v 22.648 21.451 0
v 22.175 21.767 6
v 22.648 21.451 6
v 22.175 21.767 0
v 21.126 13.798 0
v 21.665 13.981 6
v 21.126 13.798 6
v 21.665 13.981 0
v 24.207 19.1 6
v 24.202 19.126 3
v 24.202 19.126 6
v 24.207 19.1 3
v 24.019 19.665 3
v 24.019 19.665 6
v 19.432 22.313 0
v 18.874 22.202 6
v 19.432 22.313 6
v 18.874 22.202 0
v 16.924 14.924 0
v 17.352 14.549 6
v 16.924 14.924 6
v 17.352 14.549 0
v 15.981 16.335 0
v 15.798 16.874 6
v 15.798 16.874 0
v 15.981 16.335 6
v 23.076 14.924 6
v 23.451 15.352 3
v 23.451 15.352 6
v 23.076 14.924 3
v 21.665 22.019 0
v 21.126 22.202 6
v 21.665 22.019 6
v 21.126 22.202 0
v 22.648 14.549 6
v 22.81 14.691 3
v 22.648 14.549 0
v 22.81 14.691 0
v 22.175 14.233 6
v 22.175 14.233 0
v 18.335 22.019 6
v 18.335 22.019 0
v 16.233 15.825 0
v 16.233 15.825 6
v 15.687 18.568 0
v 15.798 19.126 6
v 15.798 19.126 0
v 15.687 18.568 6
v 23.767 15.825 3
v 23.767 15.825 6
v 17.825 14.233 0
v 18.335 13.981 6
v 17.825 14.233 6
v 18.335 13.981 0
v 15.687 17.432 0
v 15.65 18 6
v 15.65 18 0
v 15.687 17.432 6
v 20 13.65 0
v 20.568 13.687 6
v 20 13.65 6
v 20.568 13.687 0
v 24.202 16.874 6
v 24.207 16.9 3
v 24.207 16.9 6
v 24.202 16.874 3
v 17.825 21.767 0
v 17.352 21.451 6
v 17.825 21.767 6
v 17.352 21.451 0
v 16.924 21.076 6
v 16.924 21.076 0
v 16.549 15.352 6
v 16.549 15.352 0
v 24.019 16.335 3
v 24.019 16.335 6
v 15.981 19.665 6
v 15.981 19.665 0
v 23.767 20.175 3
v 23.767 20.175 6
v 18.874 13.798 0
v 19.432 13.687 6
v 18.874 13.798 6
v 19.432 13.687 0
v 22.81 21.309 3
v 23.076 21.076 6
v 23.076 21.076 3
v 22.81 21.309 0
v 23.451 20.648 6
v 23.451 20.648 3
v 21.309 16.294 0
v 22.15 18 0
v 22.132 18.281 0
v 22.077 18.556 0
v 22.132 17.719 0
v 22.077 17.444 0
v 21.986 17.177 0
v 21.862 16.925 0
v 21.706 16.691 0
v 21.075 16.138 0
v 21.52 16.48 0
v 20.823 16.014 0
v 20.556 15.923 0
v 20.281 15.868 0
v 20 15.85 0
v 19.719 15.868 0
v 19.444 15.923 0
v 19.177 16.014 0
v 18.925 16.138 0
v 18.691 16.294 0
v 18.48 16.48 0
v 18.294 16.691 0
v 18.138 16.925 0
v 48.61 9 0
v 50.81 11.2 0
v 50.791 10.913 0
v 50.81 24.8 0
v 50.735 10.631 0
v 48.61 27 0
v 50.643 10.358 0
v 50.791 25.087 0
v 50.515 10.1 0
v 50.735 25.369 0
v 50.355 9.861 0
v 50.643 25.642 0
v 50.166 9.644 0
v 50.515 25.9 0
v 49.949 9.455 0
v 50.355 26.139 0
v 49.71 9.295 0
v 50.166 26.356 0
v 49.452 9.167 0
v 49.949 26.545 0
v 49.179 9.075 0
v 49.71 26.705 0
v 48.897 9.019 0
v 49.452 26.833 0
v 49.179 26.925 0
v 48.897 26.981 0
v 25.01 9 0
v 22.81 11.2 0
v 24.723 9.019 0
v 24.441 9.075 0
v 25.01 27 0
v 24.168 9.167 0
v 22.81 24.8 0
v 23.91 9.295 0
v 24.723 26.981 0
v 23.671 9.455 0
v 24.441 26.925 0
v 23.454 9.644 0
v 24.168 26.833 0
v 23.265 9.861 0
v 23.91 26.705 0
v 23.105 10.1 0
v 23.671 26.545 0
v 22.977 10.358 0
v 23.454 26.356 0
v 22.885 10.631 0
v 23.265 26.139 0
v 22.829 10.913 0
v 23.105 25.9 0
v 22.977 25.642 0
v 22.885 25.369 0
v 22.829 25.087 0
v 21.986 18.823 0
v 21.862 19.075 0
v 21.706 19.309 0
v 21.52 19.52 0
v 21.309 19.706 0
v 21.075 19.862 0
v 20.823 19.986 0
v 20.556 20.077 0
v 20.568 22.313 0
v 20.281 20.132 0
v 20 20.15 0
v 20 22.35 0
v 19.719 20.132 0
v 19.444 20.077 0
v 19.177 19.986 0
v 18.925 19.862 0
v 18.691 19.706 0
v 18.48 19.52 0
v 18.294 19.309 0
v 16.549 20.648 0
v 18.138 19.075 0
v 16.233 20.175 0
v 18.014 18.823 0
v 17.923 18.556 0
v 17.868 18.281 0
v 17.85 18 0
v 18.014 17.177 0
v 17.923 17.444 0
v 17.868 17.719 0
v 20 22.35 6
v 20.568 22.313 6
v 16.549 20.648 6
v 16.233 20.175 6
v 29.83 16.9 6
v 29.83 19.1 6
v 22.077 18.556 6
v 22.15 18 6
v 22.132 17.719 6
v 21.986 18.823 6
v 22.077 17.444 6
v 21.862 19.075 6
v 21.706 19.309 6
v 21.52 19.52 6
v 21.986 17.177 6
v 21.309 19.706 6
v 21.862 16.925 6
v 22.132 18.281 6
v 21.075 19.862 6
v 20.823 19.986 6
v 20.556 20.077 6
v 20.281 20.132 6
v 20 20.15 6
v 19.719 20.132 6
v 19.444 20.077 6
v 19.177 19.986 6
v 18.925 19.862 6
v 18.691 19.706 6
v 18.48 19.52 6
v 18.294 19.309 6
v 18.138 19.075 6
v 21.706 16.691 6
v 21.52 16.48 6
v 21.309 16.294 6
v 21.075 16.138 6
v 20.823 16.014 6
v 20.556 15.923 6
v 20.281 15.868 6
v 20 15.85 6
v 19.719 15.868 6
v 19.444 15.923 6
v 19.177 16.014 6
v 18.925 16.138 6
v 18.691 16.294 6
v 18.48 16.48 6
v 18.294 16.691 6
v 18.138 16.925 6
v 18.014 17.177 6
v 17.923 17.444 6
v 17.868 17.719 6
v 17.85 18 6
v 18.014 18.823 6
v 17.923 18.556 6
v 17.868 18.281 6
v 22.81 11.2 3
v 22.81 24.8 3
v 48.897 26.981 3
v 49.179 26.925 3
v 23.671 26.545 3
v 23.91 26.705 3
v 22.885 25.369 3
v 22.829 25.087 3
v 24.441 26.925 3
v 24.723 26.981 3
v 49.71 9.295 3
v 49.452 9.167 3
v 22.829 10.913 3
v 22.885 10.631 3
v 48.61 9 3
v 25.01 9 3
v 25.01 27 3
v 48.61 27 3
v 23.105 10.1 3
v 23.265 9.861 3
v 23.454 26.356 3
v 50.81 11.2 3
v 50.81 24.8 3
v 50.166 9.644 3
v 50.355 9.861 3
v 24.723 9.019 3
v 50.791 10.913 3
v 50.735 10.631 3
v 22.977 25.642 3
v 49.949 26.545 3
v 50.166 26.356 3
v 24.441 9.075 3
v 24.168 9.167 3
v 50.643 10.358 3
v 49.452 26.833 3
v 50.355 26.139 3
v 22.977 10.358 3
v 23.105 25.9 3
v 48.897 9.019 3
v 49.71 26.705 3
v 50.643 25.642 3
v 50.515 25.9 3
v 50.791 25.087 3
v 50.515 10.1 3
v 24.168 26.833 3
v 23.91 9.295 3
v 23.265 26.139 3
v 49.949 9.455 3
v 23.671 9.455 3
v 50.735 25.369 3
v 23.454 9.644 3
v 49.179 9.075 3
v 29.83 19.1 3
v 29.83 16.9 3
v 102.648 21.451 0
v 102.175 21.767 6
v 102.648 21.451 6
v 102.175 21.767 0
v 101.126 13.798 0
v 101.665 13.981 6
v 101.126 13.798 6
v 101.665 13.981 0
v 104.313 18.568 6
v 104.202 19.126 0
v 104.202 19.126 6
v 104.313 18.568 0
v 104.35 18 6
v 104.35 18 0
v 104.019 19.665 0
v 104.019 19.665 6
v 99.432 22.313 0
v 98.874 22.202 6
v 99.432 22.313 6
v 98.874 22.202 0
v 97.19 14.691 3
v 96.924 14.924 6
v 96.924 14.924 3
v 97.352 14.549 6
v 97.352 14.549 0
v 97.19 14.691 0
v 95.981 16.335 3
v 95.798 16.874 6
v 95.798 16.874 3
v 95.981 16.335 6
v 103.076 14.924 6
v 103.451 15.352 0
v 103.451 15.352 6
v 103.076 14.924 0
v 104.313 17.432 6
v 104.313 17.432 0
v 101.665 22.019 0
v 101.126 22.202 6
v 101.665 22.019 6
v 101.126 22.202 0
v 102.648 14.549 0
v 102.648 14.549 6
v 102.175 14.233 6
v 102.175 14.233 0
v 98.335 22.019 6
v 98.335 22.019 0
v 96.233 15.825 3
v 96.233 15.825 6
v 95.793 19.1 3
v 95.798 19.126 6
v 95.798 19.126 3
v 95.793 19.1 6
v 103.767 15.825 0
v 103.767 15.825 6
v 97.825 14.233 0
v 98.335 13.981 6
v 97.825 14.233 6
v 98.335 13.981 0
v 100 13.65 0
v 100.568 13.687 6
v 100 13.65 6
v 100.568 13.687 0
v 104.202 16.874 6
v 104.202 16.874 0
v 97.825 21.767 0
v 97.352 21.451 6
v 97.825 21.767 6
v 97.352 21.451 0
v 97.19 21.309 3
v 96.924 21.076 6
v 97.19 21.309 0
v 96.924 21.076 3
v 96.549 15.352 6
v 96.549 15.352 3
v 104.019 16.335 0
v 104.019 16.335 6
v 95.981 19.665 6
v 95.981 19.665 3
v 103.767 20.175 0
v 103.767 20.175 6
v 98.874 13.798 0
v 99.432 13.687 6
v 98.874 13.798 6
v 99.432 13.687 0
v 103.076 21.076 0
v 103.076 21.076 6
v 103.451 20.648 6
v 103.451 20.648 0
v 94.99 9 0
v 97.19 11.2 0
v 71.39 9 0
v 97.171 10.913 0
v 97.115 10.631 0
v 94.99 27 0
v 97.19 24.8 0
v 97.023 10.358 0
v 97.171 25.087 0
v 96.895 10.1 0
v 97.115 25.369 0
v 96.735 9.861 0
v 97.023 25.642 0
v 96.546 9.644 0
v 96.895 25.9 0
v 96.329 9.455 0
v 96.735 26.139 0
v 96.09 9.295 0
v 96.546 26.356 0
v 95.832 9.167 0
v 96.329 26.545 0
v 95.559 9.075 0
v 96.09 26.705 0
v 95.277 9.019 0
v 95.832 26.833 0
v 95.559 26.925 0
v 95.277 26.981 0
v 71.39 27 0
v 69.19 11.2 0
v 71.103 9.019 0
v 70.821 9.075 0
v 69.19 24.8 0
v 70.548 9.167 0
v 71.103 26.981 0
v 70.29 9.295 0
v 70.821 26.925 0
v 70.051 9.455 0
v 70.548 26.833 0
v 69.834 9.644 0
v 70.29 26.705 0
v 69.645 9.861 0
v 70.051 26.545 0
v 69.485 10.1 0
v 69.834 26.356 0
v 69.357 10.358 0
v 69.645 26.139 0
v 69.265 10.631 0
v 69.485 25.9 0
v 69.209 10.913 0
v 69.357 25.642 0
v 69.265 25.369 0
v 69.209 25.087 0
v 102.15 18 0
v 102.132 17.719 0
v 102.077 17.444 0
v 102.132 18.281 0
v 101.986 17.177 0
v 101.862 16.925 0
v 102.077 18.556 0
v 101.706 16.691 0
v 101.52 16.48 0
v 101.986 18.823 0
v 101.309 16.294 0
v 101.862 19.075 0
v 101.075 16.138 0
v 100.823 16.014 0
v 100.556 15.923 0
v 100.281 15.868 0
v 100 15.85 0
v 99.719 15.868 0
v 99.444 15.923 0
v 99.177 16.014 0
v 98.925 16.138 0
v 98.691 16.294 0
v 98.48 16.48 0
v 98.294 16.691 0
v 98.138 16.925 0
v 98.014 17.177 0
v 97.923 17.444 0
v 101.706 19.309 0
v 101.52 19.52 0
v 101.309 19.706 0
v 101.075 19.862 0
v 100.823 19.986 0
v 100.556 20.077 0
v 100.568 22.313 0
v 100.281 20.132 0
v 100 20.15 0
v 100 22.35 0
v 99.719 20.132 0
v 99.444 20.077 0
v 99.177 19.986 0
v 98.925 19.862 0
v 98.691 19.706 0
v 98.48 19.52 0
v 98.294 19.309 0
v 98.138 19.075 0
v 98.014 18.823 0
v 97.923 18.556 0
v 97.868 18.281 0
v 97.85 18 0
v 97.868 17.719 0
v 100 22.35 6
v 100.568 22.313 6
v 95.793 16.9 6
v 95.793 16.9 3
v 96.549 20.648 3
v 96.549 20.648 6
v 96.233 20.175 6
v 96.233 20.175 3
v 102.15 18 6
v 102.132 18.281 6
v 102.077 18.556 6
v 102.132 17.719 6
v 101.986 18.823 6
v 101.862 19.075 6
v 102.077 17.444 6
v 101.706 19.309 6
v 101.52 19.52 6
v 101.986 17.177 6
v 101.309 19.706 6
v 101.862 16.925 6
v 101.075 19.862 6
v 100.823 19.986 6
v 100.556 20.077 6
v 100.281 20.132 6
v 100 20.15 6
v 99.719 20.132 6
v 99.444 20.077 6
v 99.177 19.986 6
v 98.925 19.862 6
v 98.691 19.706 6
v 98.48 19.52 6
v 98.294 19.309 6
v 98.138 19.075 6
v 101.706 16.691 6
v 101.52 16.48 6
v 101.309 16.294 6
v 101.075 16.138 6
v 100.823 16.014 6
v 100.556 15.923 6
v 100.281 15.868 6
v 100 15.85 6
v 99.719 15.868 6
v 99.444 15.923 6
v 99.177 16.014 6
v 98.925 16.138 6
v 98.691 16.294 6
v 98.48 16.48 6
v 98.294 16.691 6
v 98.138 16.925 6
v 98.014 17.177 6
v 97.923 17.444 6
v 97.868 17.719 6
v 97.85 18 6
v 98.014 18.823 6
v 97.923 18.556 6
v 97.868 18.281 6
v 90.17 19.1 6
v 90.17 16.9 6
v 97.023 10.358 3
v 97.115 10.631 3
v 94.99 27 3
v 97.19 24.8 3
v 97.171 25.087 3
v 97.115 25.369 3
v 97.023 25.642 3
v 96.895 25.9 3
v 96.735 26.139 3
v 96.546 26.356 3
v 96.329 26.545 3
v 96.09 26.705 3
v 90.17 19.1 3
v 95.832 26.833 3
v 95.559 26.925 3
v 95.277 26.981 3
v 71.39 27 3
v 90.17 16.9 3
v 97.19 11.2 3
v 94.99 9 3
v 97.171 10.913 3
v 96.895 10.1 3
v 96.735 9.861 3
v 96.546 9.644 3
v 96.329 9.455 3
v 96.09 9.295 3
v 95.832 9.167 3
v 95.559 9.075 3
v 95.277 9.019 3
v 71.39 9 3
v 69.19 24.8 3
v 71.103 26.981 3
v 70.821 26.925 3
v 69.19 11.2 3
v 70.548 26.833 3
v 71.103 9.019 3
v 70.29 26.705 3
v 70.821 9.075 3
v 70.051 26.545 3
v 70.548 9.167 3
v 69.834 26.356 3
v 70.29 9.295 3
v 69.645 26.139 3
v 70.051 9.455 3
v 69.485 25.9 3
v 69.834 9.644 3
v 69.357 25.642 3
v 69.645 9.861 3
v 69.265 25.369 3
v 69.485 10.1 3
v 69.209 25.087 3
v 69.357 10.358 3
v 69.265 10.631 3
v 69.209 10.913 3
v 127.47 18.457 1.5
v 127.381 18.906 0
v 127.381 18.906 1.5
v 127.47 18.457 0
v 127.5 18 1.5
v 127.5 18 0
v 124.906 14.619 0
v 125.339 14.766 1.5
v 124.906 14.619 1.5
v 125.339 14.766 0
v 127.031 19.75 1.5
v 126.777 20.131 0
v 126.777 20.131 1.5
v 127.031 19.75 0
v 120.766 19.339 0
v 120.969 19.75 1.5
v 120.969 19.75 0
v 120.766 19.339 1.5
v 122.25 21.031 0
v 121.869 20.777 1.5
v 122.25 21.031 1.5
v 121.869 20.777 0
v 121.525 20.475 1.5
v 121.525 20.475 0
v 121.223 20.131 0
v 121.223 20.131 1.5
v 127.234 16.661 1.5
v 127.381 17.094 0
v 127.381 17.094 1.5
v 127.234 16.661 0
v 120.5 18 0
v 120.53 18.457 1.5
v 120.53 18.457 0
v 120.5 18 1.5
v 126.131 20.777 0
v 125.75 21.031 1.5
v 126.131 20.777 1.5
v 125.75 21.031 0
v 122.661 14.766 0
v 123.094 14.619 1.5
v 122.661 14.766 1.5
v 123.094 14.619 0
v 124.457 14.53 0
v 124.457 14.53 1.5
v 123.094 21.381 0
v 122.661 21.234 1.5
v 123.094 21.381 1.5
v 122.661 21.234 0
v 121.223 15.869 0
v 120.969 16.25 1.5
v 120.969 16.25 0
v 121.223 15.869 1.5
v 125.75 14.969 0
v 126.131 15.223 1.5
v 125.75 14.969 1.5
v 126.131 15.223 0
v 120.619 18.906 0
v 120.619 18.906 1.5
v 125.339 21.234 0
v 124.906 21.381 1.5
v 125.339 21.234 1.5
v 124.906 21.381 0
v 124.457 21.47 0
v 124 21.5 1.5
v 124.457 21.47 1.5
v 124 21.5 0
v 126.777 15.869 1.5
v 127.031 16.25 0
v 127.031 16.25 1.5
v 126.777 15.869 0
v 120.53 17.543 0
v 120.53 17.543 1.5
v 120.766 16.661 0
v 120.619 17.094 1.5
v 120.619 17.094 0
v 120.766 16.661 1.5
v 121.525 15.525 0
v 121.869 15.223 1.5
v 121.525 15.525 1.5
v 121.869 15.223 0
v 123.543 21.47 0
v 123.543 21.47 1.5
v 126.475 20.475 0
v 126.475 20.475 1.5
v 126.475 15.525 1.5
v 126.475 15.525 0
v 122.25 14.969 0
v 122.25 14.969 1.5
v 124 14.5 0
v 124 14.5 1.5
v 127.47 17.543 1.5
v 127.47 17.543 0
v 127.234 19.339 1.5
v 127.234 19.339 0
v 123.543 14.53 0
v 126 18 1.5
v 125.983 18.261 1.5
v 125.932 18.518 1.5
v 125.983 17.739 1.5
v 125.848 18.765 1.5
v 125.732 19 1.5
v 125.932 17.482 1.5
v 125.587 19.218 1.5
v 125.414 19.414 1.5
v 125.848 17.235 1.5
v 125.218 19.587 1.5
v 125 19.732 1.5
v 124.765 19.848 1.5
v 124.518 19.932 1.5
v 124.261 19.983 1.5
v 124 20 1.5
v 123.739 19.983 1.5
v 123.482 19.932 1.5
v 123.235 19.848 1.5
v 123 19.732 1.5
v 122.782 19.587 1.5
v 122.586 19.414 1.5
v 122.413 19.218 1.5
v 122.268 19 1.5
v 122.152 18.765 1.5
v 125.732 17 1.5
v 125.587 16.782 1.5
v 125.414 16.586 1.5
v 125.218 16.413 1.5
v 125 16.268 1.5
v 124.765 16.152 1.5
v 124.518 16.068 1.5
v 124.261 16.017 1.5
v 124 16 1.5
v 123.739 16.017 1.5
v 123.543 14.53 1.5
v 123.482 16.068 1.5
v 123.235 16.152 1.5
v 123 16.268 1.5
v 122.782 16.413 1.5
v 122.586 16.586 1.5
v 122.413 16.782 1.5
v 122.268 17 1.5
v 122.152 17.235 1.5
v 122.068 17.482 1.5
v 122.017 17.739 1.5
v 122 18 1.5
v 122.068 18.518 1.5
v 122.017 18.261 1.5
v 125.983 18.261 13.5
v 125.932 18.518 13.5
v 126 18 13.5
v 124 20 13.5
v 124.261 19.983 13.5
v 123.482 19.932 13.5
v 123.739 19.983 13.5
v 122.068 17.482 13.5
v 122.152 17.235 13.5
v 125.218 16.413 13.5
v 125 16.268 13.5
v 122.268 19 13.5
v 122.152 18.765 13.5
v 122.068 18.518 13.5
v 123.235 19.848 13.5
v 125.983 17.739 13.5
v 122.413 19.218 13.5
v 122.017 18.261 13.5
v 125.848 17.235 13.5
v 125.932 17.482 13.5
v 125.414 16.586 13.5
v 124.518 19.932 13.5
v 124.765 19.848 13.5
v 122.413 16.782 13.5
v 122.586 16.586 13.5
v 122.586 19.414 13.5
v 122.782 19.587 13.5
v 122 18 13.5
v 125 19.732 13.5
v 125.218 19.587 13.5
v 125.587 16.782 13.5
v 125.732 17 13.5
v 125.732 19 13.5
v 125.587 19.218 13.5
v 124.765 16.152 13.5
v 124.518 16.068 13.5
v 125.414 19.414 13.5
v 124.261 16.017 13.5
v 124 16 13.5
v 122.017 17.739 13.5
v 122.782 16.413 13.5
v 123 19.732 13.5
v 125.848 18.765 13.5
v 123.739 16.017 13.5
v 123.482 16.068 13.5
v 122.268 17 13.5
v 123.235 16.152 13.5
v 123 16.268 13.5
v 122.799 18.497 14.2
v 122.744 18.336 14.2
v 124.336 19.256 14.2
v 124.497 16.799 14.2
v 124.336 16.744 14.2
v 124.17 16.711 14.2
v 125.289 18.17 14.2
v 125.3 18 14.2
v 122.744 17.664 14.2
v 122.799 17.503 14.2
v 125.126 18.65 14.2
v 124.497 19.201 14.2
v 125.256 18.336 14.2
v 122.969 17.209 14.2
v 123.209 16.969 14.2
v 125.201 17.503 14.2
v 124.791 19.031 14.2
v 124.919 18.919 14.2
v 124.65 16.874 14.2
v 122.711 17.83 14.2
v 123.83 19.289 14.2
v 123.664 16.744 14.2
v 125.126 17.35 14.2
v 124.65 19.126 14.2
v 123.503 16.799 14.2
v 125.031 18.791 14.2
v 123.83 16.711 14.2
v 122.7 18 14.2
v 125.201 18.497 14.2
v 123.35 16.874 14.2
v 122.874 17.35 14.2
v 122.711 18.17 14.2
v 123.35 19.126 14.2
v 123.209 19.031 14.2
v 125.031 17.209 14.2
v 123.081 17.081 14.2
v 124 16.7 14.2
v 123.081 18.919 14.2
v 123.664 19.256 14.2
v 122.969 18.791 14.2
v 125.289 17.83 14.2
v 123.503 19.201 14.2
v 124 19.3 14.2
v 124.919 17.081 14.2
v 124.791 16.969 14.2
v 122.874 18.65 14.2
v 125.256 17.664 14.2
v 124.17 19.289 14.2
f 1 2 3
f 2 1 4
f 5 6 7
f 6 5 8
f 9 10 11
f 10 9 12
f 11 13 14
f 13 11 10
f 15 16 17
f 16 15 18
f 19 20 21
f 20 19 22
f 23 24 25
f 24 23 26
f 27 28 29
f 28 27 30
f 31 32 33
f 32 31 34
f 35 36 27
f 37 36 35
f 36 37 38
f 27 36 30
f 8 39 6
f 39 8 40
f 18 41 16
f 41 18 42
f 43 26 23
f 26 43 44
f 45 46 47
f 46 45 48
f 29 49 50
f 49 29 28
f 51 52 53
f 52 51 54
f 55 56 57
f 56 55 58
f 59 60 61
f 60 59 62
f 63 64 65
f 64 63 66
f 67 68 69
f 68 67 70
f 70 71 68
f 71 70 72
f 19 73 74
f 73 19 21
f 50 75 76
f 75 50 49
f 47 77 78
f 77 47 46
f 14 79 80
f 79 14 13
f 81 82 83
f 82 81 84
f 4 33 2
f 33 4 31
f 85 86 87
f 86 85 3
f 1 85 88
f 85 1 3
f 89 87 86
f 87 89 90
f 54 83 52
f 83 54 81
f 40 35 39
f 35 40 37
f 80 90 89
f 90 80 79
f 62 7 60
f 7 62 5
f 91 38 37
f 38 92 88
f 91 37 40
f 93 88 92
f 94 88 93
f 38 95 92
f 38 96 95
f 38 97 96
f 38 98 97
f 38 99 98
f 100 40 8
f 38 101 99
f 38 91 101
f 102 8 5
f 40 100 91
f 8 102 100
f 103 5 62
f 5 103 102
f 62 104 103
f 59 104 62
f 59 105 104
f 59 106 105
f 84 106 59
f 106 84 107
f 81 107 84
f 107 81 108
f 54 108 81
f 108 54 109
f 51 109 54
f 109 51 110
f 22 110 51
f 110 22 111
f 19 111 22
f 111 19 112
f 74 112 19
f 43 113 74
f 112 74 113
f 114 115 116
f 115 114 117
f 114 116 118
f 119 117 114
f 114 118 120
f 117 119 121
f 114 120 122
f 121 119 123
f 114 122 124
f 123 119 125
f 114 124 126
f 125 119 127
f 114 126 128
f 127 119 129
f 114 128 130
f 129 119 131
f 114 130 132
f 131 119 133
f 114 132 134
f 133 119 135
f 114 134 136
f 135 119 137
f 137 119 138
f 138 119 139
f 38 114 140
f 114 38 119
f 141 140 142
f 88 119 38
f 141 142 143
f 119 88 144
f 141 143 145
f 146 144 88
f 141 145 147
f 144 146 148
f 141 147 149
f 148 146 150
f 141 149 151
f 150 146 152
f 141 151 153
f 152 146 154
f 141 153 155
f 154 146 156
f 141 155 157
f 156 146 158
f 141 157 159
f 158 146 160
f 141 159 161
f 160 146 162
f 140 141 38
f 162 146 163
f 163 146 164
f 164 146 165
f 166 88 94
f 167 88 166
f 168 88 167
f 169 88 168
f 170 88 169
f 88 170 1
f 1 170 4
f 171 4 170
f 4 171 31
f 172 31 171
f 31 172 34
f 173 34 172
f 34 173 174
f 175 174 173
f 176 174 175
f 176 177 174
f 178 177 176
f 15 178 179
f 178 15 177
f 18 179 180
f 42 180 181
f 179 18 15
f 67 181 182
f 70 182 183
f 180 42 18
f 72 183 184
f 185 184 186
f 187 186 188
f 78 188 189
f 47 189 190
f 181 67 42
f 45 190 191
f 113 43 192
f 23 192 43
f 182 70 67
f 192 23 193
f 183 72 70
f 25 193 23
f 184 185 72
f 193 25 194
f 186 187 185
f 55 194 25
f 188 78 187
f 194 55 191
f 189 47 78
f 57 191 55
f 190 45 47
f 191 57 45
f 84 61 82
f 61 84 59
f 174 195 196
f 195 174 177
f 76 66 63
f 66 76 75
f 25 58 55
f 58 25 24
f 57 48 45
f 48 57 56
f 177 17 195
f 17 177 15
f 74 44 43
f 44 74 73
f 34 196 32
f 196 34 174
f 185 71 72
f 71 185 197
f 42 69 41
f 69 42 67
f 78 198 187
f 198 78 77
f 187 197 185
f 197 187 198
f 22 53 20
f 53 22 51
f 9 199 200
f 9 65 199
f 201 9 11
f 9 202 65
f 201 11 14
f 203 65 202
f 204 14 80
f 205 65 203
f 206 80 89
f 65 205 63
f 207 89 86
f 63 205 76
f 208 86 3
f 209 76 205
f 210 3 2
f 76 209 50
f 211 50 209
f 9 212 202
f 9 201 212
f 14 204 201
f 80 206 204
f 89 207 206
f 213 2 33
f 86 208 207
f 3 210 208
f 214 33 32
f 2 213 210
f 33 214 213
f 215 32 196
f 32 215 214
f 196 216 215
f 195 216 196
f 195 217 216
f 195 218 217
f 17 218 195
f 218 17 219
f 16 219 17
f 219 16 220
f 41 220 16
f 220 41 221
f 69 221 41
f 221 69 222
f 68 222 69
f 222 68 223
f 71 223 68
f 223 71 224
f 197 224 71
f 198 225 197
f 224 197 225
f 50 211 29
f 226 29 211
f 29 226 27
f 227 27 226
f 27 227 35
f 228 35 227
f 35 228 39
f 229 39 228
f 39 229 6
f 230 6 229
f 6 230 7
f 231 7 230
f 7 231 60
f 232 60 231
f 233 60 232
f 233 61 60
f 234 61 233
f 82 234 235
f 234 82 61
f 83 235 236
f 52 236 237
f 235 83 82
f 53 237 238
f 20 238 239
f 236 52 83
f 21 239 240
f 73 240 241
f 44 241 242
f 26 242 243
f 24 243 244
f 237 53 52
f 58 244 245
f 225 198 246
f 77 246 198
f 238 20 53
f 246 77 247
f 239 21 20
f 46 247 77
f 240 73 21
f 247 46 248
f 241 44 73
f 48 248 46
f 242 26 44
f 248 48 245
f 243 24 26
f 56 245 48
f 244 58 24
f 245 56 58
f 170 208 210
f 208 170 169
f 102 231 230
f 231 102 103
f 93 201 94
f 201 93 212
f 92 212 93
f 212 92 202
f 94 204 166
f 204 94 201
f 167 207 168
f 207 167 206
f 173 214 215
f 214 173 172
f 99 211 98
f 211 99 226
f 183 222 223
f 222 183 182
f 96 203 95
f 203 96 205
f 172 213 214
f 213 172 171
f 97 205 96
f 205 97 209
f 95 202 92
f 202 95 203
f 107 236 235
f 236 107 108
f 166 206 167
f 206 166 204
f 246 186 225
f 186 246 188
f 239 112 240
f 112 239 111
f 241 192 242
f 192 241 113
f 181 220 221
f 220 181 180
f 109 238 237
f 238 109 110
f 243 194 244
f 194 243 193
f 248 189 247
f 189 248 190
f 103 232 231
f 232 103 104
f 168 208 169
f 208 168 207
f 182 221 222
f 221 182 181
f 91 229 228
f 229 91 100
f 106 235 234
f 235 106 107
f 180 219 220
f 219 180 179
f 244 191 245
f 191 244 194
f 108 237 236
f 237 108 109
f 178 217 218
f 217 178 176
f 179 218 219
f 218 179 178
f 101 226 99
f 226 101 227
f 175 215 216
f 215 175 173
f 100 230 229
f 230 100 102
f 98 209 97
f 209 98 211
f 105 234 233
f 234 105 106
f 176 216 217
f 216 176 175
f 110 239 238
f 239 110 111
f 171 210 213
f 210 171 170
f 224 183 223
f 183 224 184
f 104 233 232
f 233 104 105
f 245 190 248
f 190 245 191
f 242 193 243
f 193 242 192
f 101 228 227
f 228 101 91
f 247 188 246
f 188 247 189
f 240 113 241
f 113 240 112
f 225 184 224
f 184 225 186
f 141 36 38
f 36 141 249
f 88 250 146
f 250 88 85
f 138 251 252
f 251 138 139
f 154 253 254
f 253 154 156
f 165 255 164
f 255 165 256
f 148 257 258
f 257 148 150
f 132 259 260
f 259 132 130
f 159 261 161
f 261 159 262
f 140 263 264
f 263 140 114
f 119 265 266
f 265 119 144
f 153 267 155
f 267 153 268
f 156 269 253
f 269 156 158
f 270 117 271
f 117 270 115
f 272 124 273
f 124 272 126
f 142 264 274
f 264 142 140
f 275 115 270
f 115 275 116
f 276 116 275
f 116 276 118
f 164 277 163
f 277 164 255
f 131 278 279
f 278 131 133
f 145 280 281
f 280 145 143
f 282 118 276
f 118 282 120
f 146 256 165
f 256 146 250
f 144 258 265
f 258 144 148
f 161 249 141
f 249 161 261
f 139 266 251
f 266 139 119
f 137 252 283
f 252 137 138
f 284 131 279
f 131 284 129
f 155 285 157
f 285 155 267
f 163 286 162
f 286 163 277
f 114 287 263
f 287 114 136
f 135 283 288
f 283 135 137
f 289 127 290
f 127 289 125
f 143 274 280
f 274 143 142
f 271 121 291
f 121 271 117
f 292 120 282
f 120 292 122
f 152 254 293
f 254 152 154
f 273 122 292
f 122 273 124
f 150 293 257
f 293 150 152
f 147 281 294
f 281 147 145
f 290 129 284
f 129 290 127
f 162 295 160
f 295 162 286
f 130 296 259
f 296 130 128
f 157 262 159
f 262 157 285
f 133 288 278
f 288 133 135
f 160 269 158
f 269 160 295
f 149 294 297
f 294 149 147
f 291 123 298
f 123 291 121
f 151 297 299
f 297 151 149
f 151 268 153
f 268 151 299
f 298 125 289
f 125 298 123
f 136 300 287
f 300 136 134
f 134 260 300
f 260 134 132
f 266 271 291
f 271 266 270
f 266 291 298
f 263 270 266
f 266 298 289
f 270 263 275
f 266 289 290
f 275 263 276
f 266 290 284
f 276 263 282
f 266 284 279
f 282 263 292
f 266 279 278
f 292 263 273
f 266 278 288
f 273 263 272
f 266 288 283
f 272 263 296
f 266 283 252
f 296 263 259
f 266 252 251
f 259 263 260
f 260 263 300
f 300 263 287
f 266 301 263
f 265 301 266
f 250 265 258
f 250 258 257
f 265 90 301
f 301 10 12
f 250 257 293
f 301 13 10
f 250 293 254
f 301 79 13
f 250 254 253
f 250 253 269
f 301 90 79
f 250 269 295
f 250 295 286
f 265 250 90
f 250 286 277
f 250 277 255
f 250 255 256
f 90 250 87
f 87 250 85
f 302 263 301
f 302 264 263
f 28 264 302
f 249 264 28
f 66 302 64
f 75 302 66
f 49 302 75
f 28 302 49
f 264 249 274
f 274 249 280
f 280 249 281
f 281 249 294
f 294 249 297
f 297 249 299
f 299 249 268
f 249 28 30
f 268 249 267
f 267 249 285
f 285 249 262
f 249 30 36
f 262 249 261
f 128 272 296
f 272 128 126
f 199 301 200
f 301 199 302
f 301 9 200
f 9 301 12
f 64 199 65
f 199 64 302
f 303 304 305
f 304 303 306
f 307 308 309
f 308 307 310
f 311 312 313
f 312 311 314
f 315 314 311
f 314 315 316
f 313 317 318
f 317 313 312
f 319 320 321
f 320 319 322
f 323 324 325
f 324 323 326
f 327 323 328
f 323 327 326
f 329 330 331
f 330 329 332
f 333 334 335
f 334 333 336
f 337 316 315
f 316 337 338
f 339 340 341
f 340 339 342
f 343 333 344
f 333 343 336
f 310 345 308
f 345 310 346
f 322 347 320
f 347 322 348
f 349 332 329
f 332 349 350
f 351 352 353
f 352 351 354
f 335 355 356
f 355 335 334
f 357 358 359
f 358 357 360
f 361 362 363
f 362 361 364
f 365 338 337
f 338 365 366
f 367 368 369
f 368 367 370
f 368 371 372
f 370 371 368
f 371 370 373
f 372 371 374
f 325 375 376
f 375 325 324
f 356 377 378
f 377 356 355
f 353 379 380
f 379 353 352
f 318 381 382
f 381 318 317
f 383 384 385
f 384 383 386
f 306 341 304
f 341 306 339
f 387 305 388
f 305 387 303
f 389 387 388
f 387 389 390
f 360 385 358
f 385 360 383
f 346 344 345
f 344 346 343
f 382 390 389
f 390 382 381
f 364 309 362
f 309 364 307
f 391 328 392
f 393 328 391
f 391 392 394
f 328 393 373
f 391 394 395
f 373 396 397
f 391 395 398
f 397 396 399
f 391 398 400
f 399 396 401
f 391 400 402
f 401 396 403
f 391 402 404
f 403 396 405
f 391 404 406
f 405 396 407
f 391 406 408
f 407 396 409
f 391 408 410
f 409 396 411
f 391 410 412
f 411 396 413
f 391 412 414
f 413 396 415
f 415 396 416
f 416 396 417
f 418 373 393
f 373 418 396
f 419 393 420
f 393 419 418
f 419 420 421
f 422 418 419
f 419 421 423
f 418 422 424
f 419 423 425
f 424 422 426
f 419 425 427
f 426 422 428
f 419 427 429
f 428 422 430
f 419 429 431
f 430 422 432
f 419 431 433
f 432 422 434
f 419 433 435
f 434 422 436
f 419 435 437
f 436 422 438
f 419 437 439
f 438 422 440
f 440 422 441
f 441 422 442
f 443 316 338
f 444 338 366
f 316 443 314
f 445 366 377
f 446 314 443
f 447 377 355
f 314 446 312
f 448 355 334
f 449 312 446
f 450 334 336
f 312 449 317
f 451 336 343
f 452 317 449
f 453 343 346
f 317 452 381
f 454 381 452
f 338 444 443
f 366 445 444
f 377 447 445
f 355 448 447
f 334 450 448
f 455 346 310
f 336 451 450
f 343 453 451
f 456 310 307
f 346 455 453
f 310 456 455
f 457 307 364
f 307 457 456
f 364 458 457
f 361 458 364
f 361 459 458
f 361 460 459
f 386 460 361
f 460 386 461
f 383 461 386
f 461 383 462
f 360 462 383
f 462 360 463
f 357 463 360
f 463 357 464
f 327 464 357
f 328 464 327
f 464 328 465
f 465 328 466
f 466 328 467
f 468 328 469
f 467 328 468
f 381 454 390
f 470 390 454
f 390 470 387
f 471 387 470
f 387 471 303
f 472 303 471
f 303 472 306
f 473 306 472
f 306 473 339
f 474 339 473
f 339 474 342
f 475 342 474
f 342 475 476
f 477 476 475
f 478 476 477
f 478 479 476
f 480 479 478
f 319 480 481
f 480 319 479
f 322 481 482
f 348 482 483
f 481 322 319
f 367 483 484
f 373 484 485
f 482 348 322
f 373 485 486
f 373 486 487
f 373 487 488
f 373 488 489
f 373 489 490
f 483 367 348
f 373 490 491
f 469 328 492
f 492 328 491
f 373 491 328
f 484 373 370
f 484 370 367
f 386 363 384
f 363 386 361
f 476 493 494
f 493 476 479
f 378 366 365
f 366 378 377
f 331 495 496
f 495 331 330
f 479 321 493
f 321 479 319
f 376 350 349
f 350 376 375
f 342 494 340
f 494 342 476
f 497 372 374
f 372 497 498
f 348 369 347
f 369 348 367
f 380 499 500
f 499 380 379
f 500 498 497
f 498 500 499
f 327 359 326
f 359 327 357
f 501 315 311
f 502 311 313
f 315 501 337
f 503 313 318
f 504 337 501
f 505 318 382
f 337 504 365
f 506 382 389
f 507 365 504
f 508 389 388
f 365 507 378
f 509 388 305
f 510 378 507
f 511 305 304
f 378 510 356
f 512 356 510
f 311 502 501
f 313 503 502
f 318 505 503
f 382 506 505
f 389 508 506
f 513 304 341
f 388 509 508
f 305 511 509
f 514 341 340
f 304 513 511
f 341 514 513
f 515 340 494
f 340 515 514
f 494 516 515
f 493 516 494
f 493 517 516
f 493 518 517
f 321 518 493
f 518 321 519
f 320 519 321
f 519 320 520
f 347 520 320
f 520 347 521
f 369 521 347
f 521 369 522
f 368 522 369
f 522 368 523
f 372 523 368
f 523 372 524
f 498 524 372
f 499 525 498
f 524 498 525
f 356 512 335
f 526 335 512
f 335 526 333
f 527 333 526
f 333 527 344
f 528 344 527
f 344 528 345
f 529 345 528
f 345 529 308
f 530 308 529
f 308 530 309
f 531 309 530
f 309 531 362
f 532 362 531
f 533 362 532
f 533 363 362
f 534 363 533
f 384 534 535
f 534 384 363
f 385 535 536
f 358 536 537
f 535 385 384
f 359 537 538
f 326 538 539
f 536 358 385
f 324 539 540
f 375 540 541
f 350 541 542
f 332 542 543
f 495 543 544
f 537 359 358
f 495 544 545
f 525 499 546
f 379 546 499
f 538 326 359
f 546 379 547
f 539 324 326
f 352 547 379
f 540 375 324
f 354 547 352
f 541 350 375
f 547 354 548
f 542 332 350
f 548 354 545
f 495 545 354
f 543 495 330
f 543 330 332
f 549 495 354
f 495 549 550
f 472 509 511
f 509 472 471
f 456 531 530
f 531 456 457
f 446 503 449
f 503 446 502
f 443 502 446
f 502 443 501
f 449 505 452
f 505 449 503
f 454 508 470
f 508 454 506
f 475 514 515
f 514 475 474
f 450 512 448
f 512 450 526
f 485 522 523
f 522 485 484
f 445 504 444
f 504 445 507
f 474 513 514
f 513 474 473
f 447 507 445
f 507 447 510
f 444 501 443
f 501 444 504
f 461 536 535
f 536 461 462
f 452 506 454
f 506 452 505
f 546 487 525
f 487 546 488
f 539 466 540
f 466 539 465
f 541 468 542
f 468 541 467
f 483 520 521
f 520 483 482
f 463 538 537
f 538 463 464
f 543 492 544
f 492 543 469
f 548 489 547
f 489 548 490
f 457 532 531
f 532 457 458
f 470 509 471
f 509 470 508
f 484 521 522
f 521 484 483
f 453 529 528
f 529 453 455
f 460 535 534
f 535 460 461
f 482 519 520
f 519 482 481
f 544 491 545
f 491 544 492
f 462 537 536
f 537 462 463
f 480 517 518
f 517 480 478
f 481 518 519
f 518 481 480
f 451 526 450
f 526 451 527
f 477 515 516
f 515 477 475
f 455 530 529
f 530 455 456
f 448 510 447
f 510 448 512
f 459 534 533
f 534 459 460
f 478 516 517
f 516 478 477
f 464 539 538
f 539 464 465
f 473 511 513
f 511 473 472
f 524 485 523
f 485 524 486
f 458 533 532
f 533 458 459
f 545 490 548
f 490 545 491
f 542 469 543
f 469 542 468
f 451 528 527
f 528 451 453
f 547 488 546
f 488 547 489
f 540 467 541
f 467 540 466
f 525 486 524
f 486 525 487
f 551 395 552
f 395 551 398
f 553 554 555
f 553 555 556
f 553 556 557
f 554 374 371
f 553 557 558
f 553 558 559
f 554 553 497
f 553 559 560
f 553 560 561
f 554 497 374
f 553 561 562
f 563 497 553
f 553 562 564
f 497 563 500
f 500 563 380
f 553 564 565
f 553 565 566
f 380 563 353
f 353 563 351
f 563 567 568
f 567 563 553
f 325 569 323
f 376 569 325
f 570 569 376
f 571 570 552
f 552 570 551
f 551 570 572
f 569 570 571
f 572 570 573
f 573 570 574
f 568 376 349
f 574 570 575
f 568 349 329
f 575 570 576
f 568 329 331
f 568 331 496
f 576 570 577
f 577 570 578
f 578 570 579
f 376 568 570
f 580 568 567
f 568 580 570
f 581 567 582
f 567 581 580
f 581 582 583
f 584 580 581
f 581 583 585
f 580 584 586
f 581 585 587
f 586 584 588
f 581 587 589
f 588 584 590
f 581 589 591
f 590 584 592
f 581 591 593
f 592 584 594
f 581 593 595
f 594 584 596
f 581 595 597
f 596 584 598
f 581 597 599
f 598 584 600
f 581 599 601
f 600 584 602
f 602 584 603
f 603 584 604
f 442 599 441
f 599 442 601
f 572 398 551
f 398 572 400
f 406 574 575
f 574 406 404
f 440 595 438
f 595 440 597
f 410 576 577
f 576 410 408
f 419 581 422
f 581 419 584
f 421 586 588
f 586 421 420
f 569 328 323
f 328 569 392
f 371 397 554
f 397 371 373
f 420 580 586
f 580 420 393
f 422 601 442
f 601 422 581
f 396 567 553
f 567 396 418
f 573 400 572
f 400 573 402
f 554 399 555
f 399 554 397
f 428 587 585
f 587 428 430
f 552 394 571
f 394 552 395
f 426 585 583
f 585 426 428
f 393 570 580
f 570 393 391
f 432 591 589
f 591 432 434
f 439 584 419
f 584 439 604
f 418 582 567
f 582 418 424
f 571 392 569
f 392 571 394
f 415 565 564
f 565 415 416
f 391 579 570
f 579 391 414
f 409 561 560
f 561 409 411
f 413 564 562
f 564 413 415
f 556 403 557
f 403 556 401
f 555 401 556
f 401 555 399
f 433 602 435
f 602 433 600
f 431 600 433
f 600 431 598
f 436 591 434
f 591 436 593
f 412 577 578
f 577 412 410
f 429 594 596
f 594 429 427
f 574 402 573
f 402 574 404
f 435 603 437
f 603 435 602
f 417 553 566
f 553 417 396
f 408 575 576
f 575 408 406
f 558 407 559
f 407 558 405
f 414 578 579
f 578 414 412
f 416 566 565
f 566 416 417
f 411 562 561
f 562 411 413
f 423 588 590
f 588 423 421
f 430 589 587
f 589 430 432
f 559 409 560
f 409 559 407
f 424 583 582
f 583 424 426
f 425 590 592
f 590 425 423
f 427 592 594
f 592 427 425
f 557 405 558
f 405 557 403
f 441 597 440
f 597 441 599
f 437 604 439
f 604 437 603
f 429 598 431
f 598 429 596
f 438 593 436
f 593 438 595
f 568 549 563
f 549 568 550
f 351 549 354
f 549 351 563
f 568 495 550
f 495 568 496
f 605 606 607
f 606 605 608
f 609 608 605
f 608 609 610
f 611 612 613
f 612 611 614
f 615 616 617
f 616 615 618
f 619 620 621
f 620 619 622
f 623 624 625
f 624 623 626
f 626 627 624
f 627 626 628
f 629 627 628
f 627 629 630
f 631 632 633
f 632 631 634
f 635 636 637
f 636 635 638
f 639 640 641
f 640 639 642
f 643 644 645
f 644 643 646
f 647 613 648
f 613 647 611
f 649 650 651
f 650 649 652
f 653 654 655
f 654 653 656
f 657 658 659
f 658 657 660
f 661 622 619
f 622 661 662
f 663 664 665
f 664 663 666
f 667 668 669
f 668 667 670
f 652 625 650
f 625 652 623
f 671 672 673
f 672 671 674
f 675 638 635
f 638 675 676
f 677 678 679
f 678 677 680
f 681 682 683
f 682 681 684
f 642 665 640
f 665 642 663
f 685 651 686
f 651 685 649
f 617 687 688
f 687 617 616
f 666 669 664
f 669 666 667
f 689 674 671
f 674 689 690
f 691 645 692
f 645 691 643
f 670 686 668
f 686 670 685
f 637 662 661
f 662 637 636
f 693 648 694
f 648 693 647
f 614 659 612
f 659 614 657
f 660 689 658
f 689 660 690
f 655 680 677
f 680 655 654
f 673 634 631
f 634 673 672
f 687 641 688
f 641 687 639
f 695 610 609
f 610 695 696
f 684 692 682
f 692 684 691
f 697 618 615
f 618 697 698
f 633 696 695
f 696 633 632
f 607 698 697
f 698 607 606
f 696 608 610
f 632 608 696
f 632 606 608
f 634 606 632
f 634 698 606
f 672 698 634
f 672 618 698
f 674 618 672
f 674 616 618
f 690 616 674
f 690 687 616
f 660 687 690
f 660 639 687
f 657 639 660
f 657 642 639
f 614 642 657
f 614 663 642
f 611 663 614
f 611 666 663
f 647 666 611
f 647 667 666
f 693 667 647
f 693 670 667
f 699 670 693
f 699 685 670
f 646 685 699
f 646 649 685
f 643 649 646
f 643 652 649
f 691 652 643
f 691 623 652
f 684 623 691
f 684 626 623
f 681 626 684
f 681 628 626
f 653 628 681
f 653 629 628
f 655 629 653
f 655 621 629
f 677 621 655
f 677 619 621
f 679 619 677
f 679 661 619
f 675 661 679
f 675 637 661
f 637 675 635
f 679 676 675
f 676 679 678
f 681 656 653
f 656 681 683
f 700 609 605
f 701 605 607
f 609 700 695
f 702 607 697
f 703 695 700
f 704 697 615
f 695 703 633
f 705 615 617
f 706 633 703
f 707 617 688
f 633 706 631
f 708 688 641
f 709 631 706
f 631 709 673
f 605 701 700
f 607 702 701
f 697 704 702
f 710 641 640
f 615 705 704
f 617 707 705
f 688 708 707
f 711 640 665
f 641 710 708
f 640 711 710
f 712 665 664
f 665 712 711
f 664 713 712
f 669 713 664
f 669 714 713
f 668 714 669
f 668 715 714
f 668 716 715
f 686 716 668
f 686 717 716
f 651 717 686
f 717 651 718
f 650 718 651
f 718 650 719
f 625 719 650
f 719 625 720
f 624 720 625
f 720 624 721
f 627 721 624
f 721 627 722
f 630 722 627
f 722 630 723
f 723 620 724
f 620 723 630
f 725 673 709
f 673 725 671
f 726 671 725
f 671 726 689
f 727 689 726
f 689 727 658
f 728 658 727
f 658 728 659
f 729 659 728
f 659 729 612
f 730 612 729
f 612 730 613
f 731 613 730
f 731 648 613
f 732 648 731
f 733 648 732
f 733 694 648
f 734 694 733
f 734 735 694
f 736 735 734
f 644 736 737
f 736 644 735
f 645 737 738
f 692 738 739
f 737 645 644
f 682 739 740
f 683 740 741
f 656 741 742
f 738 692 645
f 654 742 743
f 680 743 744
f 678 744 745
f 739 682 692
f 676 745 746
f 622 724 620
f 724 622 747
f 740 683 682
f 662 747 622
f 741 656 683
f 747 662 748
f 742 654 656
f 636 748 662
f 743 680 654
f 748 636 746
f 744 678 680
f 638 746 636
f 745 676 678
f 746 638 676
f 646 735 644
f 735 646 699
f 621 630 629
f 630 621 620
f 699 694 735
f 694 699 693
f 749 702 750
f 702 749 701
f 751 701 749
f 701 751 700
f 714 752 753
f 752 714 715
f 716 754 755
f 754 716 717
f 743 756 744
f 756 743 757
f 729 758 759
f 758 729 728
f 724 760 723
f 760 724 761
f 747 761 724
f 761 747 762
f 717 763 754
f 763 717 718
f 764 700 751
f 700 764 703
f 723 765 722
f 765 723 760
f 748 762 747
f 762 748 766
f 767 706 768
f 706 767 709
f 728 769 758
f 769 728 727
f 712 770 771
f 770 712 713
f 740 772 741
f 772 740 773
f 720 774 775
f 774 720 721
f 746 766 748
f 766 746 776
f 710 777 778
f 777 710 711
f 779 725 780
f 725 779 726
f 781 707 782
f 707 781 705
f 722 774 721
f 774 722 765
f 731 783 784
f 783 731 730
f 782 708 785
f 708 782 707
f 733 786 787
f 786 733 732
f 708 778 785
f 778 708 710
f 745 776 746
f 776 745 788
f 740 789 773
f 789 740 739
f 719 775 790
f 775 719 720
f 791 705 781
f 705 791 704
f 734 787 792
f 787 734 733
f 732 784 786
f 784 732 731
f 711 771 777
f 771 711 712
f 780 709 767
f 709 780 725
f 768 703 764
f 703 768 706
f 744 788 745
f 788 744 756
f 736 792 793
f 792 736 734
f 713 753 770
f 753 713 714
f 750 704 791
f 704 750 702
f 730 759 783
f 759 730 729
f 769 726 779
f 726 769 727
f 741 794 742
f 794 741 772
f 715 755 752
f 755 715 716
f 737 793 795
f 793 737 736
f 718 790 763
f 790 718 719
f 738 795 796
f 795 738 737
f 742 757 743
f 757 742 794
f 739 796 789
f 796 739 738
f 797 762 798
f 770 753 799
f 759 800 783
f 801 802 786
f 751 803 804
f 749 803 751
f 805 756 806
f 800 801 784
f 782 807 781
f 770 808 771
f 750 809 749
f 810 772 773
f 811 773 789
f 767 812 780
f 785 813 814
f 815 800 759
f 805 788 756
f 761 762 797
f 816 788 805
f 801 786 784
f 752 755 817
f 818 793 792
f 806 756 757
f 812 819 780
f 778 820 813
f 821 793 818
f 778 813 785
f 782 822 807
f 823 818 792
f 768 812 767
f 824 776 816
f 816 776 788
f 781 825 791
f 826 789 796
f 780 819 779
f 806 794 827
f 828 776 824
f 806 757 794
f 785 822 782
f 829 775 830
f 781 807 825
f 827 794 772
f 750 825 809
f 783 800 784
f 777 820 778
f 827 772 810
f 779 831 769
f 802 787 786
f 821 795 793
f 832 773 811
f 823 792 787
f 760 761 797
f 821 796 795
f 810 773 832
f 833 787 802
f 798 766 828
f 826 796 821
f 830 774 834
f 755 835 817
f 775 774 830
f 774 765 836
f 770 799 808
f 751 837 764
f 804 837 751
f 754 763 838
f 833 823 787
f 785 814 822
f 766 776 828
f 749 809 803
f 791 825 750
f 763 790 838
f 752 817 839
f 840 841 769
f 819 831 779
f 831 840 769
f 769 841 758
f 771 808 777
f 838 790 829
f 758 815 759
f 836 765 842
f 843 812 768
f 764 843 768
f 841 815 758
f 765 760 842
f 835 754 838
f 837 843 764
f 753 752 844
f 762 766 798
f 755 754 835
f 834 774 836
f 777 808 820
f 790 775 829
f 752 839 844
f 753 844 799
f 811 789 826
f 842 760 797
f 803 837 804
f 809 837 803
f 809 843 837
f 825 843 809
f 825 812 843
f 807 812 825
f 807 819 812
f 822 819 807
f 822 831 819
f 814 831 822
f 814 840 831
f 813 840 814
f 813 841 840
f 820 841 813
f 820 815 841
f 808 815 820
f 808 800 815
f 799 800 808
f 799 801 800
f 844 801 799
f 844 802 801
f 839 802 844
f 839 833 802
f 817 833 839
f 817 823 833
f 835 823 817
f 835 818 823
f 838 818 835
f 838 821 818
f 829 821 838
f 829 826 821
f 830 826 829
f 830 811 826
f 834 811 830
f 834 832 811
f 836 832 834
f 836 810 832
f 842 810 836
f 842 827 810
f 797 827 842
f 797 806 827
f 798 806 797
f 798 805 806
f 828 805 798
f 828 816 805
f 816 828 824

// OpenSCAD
/*
Sample 001: Versetztes Stiftgelenk — eng
Generated from the FDM Mechanical Sample Library.
Units: millimetres.

Override examples:
  openscad -o custom.stl -D 'view="plate"' -D 'render_fn=64' model.scad
  openscad -o preview.png -D 'view="assembly"' model.scad
*/
use <../../../library/fdm_mechanisms.scad>

render_fn = is_undef(render_fn) ? 48 : render_fn;
view = is_undef(view) ? "plate" : view;
$fn = render_fn;

sample_pin_hinge(
    view=view,
    clearance=0.15,
    pin_d=4,
    leaf_l=28
);
